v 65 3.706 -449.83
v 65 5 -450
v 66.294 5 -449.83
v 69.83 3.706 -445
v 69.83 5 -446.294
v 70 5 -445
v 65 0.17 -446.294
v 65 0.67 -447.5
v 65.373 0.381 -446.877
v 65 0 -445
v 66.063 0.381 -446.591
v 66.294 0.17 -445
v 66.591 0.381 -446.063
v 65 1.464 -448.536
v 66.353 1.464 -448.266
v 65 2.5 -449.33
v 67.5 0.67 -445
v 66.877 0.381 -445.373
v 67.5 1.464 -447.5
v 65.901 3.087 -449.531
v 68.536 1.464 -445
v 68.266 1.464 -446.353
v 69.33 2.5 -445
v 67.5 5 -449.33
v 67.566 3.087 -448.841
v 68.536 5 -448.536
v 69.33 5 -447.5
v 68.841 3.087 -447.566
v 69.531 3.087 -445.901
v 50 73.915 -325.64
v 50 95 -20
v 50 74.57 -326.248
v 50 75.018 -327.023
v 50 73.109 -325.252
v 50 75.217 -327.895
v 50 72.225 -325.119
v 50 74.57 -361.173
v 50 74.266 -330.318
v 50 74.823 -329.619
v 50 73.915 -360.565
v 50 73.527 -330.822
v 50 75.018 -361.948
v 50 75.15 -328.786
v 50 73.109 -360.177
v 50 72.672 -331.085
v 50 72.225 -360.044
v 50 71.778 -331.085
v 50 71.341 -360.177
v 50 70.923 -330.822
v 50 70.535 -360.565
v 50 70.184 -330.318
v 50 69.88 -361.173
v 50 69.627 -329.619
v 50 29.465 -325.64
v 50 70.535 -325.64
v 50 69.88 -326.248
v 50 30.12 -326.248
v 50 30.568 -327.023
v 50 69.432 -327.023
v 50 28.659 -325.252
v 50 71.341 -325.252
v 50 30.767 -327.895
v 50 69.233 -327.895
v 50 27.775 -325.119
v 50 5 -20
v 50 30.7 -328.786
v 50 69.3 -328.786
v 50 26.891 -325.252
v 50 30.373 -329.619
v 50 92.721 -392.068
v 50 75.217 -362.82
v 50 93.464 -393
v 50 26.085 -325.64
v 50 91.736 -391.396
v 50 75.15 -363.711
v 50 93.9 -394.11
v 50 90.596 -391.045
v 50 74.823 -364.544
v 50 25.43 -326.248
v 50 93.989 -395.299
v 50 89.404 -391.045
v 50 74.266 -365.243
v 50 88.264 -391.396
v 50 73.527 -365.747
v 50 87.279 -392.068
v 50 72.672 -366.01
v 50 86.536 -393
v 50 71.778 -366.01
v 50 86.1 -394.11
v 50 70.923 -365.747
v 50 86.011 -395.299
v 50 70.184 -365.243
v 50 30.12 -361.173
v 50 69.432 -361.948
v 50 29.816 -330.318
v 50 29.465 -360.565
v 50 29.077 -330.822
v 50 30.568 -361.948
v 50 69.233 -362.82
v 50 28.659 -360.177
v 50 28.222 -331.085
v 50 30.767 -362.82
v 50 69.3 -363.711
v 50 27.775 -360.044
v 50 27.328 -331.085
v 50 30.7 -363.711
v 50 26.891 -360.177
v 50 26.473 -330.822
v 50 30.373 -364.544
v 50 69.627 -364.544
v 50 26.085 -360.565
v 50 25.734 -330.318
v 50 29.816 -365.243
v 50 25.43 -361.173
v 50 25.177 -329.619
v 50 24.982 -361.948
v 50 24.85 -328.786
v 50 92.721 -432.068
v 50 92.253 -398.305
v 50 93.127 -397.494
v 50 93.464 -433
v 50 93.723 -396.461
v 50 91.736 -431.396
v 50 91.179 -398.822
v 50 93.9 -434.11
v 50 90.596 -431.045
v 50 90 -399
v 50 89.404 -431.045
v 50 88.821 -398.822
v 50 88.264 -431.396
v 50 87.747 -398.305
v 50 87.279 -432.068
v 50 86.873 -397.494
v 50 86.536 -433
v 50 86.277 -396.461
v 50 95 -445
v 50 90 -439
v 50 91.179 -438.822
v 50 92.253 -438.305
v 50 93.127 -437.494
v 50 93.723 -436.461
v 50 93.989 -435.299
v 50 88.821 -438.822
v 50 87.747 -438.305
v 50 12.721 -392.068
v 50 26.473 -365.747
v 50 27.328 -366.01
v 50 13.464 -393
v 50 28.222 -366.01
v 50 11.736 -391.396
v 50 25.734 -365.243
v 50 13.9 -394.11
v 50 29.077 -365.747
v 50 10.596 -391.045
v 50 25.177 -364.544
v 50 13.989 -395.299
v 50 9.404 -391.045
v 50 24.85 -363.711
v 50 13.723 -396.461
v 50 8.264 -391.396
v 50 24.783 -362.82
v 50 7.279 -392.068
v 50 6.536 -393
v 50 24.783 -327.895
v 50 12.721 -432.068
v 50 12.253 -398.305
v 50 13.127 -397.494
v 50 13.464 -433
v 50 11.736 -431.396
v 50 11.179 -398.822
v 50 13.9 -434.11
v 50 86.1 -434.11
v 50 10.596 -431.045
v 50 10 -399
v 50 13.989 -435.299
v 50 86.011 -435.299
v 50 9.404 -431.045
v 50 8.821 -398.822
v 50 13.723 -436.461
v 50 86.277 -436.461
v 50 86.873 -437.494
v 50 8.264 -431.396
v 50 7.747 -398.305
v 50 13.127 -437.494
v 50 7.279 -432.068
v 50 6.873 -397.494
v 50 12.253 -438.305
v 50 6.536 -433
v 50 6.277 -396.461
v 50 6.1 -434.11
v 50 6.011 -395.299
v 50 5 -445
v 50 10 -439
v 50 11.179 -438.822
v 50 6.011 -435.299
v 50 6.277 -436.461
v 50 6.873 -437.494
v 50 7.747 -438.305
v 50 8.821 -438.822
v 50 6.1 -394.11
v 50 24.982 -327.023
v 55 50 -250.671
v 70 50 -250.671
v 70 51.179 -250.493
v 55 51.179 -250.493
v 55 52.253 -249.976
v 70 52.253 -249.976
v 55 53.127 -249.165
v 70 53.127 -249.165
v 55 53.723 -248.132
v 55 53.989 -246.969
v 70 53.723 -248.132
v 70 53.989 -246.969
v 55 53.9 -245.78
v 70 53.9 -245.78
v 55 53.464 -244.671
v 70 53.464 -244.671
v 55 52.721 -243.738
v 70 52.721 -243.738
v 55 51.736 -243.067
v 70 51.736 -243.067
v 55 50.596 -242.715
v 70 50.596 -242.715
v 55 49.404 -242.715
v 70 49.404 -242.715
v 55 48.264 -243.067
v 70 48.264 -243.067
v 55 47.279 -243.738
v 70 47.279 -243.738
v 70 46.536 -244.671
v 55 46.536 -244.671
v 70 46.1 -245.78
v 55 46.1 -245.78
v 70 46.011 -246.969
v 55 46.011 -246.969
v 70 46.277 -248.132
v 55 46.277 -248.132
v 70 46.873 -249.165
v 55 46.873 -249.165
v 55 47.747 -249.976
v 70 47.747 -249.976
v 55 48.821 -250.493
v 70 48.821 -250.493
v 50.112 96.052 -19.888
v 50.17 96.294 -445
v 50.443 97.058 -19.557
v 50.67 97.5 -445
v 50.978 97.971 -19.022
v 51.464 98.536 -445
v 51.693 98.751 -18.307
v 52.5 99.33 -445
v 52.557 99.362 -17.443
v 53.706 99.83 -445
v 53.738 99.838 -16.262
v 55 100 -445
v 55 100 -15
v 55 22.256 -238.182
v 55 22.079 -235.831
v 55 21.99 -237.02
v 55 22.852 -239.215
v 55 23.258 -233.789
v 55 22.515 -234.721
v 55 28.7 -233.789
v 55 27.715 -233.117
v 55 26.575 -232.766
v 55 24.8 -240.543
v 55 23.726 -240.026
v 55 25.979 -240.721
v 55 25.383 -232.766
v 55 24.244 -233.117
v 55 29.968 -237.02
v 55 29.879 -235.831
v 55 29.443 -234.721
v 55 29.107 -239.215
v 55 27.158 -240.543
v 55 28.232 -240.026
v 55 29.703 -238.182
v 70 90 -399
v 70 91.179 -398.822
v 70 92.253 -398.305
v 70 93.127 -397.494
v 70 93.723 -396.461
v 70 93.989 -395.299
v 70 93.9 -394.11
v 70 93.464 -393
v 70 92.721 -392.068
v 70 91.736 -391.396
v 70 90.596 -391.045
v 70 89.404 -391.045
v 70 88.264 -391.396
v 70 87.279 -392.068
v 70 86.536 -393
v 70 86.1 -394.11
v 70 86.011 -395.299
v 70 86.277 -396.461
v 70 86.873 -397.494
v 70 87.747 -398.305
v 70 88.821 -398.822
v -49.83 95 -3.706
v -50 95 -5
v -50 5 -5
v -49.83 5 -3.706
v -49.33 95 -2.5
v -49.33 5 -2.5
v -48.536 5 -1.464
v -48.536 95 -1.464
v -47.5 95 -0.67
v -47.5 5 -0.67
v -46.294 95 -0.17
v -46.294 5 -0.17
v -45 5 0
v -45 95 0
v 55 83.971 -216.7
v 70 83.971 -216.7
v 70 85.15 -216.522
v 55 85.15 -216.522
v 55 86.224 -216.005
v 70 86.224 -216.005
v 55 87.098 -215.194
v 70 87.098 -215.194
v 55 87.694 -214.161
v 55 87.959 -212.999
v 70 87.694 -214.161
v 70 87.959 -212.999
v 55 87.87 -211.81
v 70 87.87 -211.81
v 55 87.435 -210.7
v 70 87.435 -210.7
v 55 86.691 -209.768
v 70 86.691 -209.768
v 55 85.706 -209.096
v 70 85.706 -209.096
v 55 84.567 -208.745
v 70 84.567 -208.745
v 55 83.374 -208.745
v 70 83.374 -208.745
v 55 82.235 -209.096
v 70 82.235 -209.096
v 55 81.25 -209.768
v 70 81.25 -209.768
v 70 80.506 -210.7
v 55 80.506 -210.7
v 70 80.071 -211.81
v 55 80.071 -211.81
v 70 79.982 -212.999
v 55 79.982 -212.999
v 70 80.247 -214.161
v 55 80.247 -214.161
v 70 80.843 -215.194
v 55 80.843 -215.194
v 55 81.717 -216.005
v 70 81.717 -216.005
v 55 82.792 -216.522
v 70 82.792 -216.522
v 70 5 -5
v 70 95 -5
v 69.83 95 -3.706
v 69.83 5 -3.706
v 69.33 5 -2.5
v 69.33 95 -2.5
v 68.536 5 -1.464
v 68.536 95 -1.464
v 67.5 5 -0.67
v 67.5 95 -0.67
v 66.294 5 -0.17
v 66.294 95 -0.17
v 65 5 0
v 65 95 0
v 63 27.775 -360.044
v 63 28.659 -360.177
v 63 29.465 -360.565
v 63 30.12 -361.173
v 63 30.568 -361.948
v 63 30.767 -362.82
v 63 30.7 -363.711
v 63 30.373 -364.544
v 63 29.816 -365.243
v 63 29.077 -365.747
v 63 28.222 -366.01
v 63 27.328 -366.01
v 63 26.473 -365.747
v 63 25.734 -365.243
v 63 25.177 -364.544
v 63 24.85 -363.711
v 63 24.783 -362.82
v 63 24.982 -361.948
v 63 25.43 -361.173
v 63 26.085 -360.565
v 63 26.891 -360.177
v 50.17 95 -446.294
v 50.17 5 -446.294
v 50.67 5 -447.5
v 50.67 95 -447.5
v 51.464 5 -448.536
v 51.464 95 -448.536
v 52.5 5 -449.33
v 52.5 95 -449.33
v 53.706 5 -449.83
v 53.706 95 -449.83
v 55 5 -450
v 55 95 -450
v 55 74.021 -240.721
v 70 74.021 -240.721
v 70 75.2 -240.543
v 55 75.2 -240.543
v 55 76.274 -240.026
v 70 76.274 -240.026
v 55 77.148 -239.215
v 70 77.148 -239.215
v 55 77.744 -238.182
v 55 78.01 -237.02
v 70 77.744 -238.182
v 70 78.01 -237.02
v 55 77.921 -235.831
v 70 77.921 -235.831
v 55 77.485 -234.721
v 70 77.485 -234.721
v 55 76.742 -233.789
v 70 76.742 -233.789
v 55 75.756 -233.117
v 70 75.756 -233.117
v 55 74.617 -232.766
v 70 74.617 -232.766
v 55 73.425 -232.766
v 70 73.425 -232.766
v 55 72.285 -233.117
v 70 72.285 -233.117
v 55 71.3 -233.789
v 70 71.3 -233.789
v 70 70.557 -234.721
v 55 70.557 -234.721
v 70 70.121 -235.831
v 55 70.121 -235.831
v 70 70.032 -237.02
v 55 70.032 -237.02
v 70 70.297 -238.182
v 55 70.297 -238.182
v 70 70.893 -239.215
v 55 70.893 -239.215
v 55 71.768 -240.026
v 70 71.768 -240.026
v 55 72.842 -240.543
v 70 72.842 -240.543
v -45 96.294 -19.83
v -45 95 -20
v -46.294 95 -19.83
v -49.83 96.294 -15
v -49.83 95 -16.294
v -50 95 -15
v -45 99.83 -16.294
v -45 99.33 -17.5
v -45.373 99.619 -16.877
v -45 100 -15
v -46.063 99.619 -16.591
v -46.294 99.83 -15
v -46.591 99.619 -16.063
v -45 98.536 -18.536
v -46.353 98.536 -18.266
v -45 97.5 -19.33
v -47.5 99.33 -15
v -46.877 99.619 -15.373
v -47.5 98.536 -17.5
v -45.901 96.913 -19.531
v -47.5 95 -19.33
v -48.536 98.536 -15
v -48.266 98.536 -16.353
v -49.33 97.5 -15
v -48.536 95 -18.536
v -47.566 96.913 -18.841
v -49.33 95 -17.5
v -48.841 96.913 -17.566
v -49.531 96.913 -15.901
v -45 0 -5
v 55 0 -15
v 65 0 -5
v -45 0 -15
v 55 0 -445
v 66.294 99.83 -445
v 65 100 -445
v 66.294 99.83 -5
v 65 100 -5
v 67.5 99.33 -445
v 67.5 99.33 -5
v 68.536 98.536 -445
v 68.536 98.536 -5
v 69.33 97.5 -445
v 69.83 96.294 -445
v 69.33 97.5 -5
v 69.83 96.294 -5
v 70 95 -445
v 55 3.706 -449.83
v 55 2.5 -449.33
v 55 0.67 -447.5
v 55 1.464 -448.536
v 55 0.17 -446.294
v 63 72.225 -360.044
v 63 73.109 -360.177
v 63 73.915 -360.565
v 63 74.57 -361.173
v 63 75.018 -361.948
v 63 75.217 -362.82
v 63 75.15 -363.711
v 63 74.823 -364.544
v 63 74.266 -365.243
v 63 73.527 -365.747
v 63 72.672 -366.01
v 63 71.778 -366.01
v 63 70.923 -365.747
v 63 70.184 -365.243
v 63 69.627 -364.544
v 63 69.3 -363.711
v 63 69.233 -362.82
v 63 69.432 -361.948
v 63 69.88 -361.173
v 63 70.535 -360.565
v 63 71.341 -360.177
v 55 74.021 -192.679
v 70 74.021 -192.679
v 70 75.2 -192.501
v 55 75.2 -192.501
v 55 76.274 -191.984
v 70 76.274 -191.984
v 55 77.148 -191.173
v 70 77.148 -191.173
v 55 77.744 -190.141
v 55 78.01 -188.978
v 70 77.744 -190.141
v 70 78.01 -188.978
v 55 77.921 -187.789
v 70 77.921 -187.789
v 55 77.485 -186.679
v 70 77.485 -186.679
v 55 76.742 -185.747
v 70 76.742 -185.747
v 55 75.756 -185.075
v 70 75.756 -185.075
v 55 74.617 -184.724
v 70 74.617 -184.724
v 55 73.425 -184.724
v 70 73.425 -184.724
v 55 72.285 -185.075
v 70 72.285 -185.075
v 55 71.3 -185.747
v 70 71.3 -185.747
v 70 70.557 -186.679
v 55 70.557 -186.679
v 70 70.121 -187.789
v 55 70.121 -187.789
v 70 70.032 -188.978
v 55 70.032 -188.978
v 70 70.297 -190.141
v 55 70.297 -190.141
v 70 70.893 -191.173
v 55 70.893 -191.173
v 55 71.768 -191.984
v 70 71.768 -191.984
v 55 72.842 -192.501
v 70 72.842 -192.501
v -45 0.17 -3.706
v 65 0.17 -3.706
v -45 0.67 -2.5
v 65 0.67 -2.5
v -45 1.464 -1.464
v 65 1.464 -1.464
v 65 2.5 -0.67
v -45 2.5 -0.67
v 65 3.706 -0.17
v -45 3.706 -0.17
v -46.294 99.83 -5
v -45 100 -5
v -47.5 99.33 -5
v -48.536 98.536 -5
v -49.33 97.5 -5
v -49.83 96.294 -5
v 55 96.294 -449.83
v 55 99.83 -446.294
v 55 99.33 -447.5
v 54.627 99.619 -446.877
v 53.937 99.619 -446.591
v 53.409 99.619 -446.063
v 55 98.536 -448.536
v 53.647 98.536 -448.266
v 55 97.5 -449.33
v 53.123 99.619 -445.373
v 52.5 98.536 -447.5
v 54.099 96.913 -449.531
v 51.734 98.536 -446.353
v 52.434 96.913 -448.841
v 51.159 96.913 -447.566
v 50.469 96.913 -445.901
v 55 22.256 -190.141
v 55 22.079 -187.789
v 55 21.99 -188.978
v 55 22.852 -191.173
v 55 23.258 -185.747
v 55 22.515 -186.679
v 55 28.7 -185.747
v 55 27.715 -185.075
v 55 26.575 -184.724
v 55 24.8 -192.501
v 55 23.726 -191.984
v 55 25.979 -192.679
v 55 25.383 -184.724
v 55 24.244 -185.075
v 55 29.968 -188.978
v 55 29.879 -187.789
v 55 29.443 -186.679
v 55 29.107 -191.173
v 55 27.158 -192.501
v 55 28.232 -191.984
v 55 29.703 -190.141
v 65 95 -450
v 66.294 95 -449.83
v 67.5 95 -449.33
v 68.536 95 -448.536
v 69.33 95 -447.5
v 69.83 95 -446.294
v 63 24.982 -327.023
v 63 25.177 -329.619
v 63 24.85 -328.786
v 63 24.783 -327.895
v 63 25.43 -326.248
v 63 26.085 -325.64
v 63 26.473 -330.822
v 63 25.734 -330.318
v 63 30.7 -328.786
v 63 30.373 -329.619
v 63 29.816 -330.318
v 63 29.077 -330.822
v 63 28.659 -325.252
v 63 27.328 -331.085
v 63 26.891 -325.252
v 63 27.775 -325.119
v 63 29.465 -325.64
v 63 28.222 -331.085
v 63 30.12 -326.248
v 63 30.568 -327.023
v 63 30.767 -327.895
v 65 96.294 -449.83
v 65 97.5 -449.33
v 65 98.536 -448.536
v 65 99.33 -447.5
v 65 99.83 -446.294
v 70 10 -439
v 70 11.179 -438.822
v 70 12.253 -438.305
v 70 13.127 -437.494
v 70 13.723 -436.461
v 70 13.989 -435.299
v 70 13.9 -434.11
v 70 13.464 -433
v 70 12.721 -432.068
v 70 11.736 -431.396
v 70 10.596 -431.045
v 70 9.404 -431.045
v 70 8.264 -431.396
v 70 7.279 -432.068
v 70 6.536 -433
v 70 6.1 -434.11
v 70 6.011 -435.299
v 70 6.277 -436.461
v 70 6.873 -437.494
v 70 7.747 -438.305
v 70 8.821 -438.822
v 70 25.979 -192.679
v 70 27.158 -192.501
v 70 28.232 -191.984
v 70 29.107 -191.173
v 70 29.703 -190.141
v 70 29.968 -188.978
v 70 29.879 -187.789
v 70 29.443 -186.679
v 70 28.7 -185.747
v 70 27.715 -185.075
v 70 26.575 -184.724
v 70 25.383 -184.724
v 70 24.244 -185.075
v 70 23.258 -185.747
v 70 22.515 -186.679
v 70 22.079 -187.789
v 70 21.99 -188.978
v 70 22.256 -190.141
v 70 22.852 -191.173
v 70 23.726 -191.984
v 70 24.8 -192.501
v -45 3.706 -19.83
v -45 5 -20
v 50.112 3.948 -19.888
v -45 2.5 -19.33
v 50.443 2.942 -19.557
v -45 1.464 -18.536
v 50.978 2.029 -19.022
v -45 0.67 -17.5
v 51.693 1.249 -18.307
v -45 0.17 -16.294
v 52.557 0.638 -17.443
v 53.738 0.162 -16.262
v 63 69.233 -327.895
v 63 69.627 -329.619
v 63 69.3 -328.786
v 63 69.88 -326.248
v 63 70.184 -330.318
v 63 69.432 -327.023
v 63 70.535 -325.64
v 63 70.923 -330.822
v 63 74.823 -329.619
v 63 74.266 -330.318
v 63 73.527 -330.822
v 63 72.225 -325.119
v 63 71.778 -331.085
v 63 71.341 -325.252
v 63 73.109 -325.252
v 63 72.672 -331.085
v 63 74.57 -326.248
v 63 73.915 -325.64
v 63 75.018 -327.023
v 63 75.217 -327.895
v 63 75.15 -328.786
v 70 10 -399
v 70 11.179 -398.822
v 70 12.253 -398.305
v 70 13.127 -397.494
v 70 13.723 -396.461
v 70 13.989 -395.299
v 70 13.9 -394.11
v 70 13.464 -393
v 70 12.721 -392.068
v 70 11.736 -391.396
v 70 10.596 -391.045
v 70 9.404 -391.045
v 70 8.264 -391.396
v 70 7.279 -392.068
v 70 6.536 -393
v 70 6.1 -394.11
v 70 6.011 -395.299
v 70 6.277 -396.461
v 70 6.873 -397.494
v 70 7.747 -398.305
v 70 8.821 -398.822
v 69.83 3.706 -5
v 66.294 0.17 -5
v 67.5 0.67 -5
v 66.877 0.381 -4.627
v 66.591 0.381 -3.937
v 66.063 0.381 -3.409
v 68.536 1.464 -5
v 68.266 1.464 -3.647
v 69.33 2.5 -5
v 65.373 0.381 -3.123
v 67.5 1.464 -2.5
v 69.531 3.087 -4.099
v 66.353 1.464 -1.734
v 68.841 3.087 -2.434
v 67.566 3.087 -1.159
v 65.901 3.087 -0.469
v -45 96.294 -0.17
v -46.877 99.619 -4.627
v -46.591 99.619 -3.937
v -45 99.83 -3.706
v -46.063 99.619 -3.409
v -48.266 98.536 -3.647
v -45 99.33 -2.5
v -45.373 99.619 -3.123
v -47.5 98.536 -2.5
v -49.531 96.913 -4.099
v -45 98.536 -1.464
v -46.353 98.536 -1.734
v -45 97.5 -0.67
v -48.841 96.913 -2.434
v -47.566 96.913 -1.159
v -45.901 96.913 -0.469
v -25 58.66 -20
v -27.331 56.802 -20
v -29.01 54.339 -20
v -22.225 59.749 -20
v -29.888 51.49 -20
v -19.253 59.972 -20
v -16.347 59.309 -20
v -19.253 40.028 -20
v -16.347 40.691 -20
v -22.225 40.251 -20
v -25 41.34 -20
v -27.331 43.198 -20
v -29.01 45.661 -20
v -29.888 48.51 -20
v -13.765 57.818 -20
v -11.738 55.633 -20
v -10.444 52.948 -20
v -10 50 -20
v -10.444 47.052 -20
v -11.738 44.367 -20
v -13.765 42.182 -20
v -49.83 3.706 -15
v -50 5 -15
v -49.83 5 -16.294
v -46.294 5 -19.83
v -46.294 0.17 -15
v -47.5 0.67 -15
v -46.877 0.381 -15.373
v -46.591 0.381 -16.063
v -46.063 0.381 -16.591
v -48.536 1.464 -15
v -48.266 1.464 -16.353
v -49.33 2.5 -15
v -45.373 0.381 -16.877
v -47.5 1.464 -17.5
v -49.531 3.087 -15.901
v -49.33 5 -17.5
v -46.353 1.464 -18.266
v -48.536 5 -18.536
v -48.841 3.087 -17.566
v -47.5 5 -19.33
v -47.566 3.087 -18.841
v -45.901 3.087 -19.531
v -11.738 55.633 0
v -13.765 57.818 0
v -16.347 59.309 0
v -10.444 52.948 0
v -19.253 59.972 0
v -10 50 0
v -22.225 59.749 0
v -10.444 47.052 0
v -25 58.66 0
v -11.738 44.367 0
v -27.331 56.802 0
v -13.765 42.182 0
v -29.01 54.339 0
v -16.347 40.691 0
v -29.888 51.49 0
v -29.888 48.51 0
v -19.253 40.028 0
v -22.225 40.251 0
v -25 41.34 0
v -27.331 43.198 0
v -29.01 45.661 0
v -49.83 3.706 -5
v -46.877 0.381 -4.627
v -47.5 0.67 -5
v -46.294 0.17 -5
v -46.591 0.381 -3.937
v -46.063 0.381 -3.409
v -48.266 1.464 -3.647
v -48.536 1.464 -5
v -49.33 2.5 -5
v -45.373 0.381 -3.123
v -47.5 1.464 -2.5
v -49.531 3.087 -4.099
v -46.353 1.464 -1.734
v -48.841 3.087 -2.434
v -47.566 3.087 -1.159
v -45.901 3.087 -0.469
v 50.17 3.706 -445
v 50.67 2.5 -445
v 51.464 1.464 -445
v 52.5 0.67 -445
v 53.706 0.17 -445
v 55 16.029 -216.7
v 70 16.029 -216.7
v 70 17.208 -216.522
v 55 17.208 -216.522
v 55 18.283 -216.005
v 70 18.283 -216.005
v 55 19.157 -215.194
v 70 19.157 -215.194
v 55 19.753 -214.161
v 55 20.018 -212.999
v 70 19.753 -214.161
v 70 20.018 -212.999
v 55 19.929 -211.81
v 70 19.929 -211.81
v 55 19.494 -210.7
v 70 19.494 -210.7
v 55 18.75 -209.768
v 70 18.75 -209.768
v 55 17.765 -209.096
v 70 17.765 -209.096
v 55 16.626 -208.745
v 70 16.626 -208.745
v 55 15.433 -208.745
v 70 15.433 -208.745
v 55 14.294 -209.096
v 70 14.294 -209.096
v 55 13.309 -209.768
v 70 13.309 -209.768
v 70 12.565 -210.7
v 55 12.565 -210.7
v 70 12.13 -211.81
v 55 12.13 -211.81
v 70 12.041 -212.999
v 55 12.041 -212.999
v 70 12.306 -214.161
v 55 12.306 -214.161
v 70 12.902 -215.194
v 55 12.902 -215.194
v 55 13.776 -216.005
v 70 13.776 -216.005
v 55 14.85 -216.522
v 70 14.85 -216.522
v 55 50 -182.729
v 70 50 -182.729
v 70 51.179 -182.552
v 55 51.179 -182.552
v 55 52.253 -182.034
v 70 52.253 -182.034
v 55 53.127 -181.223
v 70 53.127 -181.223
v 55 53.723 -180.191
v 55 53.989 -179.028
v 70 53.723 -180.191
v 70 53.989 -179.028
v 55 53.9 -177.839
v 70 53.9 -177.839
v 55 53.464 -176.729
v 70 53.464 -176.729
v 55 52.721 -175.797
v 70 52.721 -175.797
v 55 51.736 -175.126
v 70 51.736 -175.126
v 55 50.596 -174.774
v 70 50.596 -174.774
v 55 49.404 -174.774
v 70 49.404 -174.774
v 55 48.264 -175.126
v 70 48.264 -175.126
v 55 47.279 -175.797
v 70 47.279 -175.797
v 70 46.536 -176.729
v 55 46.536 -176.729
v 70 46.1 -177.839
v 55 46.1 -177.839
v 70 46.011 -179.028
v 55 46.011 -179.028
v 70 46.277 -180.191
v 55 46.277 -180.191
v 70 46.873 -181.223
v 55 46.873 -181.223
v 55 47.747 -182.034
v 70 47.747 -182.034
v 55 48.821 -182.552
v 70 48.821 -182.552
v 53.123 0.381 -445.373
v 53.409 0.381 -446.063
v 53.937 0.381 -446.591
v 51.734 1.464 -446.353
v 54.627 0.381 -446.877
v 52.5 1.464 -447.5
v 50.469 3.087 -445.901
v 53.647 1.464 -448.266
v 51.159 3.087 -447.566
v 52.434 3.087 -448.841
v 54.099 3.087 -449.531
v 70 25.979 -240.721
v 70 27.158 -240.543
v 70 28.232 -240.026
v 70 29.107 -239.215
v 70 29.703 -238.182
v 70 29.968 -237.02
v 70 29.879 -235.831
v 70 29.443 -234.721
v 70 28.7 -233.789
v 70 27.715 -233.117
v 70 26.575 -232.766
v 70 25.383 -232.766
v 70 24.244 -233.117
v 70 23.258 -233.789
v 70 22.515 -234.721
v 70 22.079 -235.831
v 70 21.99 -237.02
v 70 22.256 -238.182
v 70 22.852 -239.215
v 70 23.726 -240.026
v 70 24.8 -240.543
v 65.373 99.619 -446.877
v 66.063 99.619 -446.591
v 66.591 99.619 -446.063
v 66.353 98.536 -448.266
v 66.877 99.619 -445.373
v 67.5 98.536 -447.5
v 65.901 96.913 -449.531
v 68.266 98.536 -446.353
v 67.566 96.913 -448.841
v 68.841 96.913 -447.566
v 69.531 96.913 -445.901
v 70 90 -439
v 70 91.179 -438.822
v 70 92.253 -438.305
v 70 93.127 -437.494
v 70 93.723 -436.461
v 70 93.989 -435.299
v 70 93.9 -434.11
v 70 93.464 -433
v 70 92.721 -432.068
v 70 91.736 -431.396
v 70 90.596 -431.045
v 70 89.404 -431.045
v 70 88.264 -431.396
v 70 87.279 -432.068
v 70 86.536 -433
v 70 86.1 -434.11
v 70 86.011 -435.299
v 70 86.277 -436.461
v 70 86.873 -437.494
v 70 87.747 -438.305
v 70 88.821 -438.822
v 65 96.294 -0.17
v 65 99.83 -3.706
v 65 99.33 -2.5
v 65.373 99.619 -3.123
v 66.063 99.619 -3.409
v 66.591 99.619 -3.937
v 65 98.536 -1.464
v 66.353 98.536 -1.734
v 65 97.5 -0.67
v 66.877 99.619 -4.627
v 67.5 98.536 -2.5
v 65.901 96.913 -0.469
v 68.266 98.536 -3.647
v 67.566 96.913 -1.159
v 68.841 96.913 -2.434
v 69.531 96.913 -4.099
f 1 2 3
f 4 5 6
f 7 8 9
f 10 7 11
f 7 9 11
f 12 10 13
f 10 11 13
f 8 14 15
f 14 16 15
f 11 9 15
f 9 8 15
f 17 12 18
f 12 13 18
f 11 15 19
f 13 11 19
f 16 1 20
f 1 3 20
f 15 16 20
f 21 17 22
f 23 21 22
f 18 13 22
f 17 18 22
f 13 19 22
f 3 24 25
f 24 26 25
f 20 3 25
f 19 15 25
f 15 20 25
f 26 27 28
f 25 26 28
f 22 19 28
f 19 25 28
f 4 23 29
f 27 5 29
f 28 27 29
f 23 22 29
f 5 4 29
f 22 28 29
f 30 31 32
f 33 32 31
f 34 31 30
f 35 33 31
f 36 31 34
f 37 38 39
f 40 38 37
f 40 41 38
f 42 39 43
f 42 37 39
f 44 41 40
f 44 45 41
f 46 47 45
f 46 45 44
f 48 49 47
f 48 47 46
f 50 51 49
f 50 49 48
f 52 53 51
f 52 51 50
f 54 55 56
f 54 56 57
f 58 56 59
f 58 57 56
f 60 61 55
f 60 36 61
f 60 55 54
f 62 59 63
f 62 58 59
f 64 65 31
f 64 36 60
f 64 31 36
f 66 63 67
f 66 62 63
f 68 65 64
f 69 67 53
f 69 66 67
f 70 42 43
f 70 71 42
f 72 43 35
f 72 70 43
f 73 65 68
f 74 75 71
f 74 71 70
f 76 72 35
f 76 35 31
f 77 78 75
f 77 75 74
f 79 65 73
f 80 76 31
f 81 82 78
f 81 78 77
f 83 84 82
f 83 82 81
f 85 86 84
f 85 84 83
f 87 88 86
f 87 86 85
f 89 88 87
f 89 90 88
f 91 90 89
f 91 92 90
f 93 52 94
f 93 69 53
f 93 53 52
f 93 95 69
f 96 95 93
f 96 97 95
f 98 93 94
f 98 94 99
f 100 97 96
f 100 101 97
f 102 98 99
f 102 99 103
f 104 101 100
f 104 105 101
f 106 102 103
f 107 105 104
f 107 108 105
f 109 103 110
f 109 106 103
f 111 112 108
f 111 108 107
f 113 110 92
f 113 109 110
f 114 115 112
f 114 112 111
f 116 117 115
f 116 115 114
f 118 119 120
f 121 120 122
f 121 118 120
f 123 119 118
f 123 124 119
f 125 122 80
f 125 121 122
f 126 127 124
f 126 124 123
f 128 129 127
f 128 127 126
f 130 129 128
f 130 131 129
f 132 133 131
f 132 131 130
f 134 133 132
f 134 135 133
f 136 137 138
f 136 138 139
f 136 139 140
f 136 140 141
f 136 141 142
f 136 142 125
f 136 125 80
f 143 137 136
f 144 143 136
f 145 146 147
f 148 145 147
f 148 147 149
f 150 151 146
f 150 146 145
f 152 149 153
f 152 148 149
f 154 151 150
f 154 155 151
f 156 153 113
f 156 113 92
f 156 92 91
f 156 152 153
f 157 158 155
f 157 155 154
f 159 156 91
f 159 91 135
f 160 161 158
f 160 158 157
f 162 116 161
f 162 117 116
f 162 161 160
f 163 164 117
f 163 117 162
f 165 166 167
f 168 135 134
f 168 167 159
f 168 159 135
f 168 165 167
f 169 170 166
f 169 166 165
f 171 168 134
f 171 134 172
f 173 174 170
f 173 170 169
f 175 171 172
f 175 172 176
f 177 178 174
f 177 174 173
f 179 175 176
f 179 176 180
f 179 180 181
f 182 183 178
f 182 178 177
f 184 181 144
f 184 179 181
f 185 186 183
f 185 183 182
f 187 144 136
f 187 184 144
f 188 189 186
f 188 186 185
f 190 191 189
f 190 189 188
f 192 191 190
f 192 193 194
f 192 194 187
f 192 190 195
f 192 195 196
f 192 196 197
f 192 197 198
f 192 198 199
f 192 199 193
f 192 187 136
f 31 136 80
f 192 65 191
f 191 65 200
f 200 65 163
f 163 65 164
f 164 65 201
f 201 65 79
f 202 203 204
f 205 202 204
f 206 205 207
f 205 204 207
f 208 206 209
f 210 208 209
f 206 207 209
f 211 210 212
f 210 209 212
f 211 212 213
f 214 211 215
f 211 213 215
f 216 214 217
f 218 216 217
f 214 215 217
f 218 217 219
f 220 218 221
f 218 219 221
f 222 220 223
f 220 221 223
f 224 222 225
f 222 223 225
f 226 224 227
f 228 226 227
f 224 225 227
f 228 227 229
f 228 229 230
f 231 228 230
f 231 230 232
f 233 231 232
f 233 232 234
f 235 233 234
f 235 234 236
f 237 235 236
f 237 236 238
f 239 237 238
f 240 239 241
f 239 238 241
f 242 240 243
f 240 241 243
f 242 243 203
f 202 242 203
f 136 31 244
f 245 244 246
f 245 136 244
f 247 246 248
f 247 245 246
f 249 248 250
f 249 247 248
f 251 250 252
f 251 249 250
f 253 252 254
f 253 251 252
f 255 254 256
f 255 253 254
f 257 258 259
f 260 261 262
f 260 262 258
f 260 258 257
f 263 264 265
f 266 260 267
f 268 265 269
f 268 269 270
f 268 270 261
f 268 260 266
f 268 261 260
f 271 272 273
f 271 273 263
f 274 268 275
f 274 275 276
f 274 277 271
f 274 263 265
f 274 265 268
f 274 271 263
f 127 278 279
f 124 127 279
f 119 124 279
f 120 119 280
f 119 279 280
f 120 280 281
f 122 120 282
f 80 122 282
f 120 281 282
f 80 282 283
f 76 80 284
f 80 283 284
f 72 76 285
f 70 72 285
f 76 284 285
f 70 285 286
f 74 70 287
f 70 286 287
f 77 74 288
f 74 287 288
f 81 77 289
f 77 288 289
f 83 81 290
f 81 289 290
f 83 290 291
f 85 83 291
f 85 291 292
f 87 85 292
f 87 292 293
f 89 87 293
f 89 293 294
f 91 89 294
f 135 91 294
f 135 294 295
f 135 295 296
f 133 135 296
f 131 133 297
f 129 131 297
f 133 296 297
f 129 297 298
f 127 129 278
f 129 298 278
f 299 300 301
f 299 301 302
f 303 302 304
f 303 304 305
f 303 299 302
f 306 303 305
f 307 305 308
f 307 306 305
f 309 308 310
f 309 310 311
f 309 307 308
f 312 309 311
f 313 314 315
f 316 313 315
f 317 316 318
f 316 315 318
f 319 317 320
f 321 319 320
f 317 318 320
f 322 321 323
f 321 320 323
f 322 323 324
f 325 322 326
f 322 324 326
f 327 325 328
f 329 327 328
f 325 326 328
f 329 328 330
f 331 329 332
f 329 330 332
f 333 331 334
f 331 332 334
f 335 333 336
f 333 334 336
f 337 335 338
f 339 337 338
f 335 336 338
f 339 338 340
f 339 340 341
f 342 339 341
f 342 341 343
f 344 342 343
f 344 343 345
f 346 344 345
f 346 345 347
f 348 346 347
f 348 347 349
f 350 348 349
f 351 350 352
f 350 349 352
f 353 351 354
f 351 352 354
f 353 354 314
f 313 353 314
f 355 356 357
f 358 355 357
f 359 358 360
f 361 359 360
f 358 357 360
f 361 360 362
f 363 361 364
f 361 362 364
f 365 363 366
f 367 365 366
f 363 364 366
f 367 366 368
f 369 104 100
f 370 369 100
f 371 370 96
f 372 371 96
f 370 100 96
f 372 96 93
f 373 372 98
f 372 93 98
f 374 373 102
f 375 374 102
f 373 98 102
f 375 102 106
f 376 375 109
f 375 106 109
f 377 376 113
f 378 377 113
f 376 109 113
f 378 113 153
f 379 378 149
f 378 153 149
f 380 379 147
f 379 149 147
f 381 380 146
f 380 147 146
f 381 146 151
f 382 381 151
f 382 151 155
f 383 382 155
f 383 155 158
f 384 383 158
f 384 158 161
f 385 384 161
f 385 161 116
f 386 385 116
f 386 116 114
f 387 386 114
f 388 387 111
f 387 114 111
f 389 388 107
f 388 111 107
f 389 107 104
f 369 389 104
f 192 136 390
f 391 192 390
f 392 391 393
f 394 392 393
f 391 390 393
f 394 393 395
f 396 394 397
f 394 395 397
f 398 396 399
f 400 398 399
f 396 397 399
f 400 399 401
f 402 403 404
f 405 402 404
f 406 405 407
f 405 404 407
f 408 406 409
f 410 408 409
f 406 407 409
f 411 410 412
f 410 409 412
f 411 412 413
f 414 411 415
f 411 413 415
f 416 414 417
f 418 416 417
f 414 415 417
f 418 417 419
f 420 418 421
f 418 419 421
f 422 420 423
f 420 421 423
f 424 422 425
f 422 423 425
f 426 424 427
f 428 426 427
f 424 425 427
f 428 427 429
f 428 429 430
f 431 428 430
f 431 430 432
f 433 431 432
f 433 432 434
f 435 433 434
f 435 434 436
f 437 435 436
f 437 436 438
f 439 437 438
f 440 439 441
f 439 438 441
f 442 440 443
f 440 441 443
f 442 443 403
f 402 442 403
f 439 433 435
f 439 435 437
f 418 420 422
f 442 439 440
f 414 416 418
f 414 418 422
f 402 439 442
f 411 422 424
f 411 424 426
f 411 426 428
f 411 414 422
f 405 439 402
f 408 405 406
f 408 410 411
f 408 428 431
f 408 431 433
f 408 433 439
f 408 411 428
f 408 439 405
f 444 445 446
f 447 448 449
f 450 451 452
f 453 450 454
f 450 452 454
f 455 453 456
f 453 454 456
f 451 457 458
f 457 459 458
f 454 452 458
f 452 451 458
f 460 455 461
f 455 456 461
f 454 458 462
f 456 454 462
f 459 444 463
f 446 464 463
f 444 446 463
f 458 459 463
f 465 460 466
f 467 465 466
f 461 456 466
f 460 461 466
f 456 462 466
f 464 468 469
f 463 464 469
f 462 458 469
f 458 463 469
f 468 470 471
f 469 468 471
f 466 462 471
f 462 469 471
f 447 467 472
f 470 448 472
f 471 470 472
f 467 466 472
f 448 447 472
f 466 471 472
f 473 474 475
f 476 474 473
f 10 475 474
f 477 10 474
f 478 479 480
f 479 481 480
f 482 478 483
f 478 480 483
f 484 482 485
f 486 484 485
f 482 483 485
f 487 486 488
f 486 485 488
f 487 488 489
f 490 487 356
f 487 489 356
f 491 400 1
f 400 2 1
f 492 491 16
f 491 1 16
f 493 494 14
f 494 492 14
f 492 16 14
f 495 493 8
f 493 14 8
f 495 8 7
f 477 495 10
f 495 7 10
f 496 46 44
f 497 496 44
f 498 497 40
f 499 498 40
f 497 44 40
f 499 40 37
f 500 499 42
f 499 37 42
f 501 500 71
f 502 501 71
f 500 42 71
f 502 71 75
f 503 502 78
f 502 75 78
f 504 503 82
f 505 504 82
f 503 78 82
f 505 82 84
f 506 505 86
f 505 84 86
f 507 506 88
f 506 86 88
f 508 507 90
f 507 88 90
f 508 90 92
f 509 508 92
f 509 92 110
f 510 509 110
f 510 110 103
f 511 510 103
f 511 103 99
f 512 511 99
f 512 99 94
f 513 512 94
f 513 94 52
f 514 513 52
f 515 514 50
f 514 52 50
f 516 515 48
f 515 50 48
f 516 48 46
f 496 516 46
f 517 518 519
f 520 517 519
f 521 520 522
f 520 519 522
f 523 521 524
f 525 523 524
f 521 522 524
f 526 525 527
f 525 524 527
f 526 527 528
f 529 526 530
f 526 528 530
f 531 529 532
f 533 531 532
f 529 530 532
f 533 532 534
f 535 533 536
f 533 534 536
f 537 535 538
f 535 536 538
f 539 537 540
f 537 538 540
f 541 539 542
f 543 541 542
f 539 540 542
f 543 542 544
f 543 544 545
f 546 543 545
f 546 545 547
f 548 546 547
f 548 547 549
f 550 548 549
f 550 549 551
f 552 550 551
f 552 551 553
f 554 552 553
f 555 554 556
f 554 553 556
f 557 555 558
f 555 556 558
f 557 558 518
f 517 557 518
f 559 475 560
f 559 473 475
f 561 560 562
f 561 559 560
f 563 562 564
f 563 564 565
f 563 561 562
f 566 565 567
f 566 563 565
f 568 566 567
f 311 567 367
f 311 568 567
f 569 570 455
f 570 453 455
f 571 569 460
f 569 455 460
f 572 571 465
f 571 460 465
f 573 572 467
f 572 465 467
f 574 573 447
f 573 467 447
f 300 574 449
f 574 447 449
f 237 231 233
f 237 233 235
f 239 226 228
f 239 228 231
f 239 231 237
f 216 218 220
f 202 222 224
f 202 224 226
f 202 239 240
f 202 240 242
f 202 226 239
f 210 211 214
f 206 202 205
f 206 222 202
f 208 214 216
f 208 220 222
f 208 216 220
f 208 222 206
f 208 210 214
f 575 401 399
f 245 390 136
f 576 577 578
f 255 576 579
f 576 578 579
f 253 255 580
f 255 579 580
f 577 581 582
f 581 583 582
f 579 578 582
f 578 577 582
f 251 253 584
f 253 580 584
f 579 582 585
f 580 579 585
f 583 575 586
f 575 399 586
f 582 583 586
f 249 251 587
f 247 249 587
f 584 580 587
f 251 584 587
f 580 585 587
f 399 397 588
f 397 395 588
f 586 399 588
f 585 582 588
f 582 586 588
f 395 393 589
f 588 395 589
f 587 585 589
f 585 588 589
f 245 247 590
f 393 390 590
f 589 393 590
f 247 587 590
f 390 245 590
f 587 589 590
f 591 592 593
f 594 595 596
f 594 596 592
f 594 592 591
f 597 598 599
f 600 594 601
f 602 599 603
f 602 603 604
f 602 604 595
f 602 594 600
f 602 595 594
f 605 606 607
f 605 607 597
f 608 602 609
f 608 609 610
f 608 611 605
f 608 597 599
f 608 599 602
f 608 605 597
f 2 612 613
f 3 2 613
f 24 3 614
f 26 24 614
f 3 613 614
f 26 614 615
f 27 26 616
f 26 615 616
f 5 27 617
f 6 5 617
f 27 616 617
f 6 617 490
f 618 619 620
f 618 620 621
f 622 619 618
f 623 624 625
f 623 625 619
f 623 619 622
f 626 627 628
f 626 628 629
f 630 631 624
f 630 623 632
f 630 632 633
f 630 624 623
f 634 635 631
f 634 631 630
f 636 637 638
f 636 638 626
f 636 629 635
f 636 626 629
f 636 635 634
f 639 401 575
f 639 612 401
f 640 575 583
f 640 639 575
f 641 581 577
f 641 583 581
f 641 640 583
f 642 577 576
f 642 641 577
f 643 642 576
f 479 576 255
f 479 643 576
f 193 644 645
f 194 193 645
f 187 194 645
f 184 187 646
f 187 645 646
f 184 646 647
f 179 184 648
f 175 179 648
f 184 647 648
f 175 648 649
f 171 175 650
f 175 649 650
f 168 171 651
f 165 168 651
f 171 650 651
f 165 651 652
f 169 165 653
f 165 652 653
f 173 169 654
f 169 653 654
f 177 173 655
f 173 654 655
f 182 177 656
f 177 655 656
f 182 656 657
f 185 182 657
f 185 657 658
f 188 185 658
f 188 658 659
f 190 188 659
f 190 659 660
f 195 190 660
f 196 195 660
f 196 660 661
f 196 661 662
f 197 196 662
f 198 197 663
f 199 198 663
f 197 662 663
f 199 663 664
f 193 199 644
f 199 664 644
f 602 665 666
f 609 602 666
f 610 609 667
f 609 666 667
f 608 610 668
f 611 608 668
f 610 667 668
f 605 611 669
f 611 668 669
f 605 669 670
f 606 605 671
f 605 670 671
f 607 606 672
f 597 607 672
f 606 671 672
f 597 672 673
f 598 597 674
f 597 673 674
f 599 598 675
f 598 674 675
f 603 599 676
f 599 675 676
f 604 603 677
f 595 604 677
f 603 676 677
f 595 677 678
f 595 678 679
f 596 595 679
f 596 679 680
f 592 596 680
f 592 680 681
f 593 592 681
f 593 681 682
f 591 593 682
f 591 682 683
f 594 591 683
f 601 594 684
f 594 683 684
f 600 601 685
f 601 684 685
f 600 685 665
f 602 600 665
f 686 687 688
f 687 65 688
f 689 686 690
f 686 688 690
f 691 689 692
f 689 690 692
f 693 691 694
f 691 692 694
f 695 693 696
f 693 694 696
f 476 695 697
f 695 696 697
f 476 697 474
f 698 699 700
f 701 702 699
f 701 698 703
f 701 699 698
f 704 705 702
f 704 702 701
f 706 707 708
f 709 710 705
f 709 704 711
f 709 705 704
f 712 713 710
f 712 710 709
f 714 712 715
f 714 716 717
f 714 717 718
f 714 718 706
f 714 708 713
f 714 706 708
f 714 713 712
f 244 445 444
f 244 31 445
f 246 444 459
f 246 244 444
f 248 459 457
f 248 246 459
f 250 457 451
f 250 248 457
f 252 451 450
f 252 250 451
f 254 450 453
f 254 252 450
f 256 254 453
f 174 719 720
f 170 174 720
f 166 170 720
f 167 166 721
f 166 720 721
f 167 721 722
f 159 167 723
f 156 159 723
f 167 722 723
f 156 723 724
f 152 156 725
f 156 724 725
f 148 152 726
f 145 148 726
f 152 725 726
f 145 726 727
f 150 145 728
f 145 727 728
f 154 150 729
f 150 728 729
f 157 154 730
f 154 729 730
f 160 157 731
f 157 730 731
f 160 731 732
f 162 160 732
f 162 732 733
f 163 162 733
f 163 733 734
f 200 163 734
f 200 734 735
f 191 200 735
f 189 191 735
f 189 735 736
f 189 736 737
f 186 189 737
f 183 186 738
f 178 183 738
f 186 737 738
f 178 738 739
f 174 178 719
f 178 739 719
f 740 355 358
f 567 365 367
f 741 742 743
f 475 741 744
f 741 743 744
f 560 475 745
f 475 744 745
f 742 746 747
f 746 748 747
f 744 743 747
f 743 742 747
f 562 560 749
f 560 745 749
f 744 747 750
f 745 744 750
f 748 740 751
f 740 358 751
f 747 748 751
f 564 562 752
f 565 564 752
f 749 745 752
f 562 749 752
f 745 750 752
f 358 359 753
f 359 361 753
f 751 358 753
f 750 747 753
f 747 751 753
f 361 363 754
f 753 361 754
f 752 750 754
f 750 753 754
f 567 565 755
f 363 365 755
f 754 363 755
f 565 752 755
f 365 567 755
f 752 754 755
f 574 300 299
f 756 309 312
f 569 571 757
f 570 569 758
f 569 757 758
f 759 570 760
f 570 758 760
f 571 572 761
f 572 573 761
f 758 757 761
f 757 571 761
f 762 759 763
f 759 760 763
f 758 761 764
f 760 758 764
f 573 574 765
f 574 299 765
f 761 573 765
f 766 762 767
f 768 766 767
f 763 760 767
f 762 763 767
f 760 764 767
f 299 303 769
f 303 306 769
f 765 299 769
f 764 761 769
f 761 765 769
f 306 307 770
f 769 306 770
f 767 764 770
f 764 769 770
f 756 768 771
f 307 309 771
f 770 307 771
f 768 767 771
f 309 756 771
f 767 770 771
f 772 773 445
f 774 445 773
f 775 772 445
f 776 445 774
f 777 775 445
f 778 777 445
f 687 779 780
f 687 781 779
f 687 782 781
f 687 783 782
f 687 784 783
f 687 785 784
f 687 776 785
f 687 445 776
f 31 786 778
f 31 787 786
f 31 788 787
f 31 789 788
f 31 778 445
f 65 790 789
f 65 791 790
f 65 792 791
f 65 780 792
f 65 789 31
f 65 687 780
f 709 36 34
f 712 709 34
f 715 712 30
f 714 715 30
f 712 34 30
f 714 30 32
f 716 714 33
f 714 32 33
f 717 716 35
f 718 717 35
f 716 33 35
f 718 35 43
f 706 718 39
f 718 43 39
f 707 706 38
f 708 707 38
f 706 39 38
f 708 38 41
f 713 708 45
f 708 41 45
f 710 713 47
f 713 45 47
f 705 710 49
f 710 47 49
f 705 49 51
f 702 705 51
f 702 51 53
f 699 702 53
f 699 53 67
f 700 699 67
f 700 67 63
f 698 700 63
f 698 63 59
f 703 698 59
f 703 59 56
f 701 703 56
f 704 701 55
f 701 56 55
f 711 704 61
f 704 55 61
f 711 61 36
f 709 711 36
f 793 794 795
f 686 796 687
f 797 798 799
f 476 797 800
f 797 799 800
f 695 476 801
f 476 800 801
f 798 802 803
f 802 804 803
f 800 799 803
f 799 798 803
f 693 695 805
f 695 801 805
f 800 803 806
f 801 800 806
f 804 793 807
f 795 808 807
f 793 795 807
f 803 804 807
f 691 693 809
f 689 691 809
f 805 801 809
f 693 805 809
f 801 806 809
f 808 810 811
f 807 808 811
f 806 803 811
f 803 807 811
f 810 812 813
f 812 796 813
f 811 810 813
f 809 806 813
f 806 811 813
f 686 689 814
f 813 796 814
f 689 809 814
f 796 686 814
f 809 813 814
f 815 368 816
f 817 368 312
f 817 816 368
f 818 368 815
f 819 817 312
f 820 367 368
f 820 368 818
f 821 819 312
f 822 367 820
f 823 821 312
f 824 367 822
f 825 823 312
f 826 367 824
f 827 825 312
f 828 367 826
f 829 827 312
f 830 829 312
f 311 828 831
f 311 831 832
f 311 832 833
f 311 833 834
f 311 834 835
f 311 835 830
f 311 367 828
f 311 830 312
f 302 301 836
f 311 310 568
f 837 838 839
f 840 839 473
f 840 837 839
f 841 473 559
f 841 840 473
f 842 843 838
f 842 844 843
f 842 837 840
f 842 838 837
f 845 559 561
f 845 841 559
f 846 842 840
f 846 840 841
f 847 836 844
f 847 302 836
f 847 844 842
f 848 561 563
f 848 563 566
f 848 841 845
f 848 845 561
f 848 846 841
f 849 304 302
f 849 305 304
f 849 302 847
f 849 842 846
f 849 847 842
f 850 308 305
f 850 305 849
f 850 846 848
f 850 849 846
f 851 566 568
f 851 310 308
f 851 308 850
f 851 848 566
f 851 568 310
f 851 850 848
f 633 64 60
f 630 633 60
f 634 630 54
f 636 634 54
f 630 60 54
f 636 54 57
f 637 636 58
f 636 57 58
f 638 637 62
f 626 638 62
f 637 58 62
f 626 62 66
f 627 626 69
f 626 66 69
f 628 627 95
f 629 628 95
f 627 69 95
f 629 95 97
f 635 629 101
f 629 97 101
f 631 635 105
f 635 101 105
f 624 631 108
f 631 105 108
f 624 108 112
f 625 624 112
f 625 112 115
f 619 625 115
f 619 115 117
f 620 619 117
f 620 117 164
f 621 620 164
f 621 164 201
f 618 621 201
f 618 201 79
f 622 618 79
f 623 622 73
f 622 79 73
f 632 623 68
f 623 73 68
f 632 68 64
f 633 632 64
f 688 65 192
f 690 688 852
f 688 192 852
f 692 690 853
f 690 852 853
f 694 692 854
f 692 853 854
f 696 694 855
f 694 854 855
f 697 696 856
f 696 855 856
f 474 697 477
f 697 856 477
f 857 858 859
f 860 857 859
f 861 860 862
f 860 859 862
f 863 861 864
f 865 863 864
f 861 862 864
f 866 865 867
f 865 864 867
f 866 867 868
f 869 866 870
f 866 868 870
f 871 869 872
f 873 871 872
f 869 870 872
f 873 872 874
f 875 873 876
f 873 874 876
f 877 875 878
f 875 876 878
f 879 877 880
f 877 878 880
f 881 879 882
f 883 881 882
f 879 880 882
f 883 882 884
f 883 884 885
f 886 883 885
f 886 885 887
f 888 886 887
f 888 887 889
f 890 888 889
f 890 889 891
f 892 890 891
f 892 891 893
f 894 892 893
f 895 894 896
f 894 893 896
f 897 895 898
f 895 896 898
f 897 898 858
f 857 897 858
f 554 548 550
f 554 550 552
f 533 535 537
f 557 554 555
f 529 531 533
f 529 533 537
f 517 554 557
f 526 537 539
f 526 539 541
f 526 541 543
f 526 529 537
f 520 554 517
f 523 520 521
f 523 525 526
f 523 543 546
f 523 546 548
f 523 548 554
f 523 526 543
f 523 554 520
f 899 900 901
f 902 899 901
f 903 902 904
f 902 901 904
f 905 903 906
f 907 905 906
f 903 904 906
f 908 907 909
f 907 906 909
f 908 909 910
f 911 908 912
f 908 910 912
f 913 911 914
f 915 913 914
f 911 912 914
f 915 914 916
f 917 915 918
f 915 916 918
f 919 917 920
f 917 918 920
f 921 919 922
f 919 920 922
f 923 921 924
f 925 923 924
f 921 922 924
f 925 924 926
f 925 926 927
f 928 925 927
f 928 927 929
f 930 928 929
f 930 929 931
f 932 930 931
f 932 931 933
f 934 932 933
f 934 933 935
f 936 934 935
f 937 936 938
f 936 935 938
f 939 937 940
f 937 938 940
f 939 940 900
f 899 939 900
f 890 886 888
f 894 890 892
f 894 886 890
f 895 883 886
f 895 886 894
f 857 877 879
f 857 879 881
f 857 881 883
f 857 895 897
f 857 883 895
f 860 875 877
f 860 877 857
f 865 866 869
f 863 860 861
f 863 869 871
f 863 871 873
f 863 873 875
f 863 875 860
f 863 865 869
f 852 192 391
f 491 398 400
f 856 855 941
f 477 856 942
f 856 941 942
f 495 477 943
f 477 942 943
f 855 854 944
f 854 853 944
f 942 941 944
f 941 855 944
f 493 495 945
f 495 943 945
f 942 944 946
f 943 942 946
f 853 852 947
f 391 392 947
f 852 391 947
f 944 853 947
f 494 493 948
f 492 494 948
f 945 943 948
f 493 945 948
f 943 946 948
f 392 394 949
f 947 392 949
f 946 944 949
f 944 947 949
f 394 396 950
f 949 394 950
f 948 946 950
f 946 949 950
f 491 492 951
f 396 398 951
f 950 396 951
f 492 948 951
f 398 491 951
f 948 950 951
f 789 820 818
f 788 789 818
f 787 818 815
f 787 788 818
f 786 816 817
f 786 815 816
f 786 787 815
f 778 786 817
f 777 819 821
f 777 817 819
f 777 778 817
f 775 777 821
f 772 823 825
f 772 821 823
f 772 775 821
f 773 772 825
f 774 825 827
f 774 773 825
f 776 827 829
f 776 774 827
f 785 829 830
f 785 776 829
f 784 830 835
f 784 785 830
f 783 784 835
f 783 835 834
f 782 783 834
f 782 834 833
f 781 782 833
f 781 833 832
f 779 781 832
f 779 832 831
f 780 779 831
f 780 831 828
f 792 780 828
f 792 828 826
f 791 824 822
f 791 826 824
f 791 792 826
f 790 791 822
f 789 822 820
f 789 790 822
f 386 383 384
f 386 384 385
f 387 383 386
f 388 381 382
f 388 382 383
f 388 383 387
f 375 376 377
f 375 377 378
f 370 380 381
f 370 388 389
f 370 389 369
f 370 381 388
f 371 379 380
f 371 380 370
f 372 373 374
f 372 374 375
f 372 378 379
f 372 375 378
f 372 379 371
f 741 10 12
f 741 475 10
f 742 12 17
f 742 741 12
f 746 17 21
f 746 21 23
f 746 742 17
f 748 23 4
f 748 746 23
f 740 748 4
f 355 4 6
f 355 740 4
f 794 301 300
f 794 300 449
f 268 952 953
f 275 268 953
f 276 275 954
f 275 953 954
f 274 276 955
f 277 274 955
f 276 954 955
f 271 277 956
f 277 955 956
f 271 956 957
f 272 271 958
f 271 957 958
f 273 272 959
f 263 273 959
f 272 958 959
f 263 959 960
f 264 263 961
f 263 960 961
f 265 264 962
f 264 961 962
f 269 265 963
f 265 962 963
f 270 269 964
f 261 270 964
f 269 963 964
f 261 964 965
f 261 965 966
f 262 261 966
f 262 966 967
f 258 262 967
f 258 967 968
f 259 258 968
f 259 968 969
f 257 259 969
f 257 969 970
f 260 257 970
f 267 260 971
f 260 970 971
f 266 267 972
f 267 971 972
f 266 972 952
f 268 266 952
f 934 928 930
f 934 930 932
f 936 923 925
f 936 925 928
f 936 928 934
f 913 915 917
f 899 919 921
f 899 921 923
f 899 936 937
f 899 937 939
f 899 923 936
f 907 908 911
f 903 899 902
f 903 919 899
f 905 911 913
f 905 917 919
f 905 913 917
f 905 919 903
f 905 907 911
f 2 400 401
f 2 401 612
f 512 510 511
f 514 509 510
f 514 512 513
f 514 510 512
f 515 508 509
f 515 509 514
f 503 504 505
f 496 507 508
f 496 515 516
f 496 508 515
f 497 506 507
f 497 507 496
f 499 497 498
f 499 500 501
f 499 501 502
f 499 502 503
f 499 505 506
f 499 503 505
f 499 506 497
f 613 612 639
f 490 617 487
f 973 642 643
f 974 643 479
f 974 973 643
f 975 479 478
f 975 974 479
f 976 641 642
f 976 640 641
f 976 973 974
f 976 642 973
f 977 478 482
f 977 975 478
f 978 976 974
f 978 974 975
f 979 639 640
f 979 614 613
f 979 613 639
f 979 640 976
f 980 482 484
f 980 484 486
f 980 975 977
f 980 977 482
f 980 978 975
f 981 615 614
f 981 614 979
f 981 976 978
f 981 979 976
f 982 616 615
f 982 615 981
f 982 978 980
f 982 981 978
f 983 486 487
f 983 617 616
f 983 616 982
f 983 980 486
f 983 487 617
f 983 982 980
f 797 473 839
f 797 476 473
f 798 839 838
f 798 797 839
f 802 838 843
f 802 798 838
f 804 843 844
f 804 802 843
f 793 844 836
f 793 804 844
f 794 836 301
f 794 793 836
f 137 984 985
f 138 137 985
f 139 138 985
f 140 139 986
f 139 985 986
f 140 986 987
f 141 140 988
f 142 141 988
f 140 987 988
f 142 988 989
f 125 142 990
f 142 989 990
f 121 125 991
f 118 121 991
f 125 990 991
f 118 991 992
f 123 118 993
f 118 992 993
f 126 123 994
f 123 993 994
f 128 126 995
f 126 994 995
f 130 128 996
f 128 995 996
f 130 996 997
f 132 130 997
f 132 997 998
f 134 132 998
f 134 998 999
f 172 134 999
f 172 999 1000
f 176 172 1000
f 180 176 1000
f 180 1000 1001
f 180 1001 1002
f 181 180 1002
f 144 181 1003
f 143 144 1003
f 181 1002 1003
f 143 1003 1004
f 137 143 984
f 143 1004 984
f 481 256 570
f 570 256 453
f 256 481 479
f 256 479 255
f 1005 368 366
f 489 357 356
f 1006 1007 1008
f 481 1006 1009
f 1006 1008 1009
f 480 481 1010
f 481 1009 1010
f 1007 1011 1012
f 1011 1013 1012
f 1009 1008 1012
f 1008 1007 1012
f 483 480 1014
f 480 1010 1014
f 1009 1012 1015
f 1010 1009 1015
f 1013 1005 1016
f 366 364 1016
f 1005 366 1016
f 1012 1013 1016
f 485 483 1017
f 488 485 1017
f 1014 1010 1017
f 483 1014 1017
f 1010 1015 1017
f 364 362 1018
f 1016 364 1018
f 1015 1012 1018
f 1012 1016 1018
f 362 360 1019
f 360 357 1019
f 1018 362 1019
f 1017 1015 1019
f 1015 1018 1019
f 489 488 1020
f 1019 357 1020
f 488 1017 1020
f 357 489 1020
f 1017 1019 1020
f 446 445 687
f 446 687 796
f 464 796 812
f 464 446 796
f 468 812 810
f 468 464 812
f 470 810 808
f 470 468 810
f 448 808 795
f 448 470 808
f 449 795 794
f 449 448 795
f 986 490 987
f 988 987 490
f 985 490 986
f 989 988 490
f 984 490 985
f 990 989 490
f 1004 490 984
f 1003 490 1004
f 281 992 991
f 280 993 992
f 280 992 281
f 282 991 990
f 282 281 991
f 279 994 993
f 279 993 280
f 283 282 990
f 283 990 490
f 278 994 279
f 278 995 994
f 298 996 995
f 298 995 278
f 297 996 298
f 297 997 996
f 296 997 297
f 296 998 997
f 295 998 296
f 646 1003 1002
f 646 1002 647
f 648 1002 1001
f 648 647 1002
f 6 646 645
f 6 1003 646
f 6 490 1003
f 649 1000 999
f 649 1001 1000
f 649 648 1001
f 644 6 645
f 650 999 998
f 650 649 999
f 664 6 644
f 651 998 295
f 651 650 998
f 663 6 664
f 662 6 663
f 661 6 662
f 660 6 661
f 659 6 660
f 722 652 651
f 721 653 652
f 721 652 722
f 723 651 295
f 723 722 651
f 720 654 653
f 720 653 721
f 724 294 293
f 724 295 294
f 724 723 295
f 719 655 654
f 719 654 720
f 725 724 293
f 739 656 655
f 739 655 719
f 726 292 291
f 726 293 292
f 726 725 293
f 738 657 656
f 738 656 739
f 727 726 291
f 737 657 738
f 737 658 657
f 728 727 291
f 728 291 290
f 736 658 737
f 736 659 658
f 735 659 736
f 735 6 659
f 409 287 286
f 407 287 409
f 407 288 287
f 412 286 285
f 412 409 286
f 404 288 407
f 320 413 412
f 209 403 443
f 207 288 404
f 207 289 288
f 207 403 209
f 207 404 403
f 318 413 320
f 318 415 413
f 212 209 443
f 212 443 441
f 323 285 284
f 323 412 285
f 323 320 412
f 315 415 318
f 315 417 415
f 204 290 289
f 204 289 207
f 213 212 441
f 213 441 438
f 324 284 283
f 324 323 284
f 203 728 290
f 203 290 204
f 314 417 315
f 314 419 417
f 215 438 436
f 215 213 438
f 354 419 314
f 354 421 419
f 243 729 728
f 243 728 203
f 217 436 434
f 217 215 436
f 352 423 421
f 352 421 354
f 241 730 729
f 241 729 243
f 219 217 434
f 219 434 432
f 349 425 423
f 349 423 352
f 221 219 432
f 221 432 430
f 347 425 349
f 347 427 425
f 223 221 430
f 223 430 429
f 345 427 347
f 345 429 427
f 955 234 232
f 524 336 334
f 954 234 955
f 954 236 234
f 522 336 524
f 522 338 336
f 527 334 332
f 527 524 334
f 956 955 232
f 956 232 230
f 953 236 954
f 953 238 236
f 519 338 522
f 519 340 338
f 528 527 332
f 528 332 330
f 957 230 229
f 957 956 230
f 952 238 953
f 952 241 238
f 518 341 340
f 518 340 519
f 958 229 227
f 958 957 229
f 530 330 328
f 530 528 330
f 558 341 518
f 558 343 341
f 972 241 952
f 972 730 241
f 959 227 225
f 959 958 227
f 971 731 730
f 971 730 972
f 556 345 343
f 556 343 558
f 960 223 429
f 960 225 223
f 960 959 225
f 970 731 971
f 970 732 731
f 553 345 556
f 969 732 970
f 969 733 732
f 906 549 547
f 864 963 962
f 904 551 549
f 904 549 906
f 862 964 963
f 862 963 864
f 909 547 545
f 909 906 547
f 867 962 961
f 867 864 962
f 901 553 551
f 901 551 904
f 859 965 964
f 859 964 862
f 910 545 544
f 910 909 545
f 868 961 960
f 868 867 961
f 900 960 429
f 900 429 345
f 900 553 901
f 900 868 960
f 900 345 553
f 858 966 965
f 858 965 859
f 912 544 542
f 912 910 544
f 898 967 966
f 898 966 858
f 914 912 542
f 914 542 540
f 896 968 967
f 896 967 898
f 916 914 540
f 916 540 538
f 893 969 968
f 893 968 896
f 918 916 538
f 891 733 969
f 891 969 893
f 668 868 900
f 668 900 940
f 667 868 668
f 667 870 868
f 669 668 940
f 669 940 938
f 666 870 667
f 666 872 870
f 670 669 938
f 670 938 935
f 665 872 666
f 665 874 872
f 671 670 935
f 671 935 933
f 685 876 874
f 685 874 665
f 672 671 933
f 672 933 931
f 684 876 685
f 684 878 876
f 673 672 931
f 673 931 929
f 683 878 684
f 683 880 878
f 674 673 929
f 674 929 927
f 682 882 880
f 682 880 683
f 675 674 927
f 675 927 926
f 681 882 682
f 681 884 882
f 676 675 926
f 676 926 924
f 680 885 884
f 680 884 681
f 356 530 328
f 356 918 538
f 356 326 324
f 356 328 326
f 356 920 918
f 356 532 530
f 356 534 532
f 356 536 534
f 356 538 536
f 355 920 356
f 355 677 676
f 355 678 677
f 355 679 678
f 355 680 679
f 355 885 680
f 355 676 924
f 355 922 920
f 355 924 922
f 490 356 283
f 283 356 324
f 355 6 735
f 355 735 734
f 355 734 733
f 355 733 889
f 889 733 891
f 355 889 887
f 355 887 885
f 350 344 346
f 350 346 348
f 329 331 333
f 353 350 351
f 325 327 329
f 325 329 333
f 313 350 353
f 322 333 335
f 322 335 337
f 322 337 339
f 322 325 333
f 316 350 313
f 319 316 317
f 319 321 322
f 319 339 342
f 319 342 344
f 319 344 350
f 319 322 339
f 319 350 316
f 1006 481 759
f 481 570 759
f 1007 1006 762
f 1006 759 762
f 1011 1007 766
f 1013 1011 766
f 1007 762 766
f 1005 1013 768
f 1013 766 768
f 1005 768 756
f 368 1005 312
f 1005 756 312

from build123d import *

# Parameters (mm, degrees)
BOSS_EXTRUDE1_DEPTH     = 100
CUT_EXTRUDE2_DEPTH      = 467.261729075
CUT_EXTRUDE2_DEPTH_BACK = 467.261729075
SKETCH4_R               = 10
FILLET1_R               = 5
SKETCH5_R               = 4
CUT_EXTRUDE3_DEPTH      = 15
SKETCH6_R               = 4
CUT_EXTRUDE4_DEPTH      = 20
SKETCH7_R               = 3
CUT_EXTRUDE5_DEPTH      = 13


with BuildPart() as part:
    # Sketch1 → Boss-Extrude1 (new body)
    with BuildSketch(Plane(origin=(0, 0, 0), x_dir=(1, 0, 0), z_dir=(0, 1, 0))):
        Polygon((50, 20), (50, 450), (70, 450), (70, 0), (-50, 0), (-50, 20), align=None)
    extrude(amount=BOSS_EXTRUDE1_DEPTH)

    # Sketch4 → Cut-Extrude2 (cut, two sides: drawn at the far end of the back side and taken through both)
    with BuildSketch(Plane.XY.offset(-CUT_EXTRUDE2_DEPTH_BACK)):
        with Locations((-20, 50)):
            Circle(SKETCH4_R)
    extrude(amount=CUT_EXTRUDE2_DEPTH + CUT_EXTRUDE2_DEPTH_BACK, mode=Mode.SUBTRACT)

    # Fillet1
    fillet1_edges = [part.edges().sort_by_distance(p)[0] for p in [
        (-50, 50, 0),
        (-50, 50, -20),
        (50, 50, -450),
        (70, 50, -450),
        (70, 50, 0),
        (60, 100, -450),
        (50, 100, -235),
        (0, 100, -20),
        (-50, 100, -10),
        (10, 100, 0),
        (-50, 0, -10),
        (0, 0, -20),
        (50, 0, -235),
        (60, 0, -450),
        (70, 0, -225),
        (10, 0, 0),
        (70, 100, -225),
    ]]
    fillet(fillet1_edges, radius=FILLET1_R)

    # Sketch5 → Cut-Extrude3 (cut)
    with BuildSketch(Plane(origin=(70, 0, 0), x_dir=(0, 0, -1), z_dir=(1, 0, 0))):
        with Locations((212.7, 83.970575503)):
            Circle(SKETCH5_R)
        with Locations((236.720824299, 74.020824299)):
            Circle(SKETCH5_R)
        with Locations((246.670575503, 50)):
            Circle(SKETCH5_R)
        with Locations((236.720824299, 25.979175701)):
            Circle(SKETCH5_R)
        with Locations((212.7, 16.029424497)):
            Circle(SKETCH5_R)
        with Locations((188.679175701, 25.979175701)):
            Circle(SKETCH5_R)
        with Locations((178.729424497, 50)):
            Circle(SKETCH5_R)
        with Locations((188.679175701, 74.020824299)):
            Circle(SKETCH5_R)
    extrude(amount=-CUT_EXTRUDE3_DEPTH, mode=Mode.SUBTRACT)

    # Sketch6 → Cut-Extrude4 (cut)
    with BuildSketch(Plane(origin=(70, 0, 0), x_dir=(0, 0, -1), z_dir=(1, 0, 0))):
        with Locations((395, 10)):
            Circle(SKETCH6_R)
        with Locations((435, 10)):
            Circle(SKETCH6_R)
        with Locations((435, 90)):
            Circle(SKETCH6_R)
        with Locations((395, 90)):
            Circle(SKETCH6_R)
    extrude(amount=-CUT_EXTRUDE4_DEPTH, mode=Mode.SUBTRACT)

    # Sketch7 → Cut-Extrude5 (cut)
    with BuildSketch(Plane.ZY.offset(-50)):
        with Locations((-363.04375, 72.225)):
            Circle(SKETCH7_R)
        with Locations((-328.11875, 72.225)):
            Circle(SKETCH7_R)
        with Locations((-363.04375, 27.775)):
            Circle(SKETCH7_R)
        with Locations((-328.11875, 27.775)):
            Circle(SKETCH7_R)
    extrude(amount=-CUT_EXTRUDE5_DEPTH, mode=Mode.SUBTRACT)


solid = part.part
